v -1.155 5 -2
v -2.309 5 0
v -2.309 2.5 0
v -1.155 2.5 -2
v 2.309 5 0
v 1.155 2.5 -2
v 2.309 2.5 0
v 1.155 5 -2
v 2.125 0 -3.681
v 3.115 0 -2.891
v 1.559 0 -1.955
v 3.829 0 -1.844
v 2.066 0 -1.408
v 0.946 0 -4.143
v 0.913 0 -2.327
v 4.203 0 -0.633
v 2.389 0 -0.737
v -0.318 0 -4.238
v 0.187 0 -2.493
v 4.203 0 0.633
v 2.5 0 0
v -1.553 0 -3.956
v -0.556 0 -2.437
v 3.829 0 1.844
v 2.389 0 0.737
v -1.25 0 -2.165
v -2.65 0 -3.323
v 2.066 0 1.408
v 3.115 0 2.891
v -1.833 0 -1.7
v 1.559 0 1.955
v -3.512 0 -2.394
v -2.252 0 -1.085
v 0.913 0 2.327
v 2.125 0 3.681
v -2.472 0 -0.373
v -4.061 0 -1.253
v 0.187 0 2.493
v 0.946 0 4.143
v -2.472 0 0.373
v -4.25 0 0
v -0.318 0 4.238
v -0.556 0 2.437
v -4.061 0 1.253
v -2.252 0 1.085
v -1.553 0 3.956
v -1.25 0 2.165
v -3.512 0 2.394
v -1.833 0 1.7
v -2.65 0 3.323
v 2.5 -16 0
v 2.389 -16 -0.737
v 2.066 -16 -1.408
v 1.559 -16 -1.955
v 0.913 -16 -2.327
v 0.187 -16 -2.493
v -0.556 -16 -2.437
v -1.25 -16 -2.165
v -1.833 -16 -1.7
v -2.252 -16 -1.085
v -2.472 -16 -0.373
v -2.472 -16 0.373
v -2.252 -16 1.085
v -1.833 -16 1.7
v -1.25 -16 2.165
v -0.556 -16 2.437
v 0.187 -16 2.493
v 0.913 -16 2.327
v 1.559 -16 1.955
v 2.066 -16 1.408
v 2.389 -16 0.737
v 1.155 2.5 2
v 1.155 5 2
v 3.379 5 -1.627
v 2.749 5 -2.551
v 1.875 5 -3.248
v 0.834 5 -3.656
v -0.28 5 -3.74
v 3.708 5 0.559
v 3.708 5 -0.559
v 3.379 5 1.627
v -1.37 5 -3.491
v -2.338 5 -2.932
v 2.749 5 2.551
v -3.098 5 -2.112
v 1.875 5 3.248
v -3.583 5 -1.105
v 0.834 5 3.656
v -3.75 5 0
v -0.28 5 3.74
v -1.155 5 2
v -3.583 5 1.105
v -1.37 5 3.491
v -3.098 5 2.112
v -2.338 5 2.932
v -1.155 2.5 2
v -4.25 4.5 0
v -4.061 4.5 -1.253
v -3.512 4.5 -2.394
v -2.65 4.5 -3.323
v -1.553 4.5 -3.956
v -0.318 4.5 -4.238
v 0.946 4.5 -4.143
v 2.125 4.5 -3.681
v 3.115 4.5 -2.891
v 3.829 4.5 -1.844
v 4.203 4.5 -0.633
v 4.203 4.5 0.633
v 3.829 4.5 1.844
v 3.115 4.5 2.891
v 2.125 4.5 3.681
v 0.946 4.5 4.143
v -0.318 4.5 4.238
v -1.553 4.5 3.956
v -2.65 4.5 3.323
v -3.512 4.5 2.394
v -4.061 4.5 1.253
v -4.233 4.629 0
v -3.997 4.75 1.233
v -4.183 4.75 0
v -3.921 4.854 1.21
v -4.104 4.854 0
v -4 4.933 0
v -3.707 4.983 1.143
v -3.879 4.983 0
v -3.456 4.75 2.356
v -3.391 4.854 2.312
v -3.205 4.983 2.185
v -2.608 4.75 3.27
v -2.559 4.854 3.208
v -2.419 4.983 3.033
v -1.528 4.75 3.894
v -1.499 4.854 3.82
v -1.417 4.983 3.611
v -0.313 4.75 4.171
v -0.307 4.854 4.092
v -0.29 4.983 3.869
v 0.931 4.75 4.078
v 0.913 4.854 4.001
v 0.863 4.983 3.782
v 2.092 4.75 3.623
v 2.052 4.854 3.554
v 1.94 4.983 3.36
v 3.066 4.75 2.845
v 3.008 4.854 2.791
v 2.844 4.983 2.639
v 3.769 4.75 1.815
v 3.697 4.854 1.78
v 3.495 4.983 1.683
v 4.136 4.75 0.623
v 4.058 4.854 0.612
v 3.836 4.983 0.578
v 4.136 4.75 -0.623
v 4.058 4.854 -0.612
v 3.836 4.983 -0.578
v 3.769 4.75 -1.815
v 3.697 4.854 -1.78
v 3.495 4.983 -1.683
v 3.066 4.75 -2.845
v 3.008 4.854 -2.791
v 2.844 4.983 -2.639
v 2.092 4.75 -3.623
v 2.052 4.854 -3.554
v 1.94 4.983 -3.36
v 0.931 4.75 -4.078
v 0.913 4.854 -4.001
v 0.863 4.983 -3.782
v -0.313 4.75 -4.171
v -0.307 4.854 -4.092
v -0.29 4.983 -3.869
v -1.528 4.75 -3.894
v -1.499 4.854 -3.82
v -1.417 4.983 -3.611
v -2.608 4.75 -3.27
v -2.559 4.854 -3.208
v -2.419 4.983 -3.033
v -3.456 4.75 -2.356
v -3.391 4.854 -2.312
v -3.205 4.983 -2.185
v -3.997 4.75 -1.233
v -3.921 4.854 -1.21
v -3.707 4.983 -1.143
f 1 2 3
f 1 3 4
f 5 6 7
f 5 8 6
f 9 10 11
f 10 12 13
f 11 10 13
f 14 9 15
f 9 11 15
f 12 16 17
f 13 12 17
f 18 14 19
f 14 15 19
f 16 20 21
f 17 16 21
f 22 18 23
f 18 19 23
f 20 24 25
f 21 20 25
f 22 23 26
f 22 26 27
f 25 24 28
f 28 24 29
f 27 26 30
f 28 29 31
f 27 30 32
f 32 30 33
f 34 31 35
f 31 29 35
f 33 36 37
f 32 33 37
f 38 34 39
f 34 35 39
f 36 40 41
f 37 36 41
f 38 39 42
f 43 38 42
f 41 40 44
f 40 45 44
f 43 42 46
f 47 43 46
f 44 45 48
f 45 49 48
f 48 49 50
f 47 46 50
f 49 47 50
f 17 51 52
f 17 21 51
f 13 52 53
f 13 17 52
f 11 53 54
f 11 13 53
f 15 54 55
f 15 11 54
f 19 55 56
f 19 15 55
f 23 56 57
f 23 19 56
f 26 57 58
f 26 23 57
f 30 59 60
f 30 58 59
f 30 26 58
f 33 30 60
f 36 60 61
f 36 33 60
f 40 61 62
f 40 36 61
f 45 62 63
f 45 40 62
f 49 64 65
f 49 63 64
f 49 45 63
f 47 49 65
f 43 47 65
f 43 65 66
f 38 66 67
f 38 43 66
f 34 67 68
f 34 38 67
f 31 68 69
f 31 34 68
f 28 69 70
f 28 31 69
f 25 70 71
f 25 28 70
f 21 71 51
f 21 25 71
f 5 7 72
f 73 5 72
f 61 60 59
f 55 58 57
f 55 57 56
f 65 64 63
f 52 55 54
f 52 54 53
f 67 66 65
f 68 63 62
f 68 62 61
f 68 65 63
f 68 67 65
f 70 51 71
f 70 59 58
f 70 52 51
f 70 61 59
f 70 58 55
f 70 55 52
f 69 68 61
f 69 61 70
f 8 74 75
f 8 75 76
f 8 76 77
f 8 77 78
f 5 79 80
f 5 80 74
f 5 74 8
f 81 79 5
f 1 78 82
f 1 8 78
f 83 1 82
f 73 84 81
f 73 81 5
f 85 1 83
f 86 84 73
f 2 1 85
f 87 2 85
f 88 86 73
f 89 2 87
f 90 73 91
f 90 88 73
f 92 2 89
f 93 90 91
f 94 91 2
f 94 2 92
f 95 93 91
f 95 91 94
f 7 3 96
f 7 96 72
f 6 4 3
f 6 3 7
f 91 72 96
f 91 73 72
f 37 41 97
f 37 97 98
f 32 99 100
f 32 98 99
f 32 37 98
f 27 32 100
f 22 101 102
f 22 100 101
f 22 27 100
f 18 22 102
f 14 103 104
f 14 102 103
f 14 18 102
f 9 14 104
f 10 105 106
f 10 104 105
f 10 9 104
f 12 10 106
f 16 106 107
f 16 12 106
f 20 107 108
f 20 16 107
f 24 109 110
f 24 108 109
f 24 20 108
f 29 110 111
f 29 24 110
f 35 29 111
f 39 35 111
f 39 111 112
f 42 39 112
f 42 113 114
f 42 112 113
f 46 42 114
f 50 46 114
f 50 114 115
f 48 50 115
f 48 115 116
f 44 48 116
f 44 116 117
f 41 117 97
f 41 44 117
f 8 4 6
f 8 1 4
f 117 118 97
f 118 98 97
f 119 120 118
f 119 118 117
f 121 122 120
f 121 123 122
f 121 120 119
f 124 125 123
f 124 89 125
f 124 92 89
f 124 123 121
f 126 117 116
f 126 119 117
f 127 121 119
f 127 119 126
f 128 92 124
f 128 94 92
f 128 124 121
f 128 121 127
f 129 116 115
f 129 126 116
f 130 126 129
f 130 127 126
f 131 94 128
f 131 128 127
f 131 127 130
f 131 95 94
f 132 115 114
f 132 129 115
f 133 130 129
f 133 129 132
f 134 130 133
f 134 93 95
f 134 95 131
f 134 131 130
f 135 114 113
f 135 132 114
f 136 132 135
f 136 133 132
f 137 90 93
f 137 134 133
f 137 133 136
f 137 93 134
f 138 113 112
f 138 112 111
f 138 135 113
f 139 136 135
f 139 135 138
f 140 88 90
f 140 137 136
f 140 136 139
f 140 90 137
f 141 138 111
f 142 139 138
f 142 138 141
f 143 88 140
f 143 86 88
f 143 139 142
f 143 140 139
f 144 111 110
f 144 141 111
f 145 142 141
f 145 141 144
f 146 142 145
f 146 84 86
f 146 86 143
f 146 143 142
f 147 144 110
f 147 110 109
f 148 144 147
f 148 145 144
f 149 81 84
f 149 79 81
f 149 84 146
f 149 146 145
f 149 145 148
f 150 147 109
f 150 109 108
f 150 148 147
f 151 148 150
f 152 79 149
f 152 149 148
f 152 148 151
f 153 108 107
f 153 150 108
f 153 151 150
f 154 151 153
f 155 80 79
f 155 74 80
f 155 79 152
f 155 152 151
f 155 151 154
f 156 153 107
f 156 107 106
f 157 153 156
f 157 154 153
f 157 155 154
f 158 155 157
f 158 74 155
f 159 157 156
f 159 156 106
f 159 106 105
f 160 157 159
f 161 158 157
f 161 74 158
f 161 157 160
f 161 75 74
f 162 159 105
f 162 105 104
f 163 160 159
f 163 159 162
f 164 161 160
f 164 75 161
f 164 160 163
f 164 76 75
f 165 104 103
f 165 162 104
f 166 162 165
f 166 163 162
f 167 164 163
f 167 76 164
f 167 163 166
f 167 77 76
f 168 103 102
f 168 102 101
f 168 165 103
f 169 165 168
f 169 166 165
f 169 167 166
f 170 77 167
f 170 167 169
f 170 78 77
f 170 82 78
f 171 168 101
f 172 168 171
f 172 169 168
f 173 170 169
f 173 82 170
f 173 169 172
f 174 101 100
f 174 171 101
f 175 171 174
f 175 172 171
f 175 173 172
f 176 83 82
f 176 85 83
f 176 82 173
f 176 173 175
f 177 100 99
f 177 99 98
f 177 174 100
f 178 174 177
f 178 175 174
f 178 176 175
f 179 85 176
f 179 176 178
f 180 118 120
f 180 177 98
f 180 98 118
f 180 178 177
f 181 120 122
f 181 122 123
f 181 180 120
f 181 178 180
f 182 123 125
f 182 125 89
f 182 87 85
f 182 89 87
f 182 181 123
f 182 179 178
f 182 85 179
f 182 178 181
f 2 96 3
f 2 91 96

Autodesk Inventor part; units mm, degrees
ref_plane "YZ Plane" through (0, 0, 0) normal (1, 0, 0) x (0, 1, 0)
ref_plane "XZ Plane" through (0, 0, 0) normal (0, 1, 0) x (-1, 0, 0)
ref_plane "XY Plane" through (0, 0, 0) normal (0, 0, 1) x (1, 0, 0)
sketch "Cap Cross Section" plane through (0, 0, 0) normal (0, 1, 0) x (-1, 0, 0)
  circle A0 centre (0, 0) radius 4.25
  dimension "d0" = 8.5
extrude "Cap" add sketch "Cap Cross Section" along normal blind 5
sketch "Key Socket Cutout Outline" plane through (0, 5, 0) normal (0, 1, 0) x (1, 0, 0)
  line L0 (1.1547, 2) -> (2.3094, 0)
  line L1 (2.3094, 0) -> (1.1547, -2)
  line L2 (1.1547, -2) -> (-1.1547, -2)
  line L3 (-1.1547, -2) -> (-2.3094, 0)
  line L4 (-2.3094, 0) -> (-1.1547, 2)
  line L5 (-1.1547, 2) -> (1.1547, 2)
  point P0 (0, 0)
  point P1 (0, 0)
  dimension "d3" = 4
extrude "Key Socket Cutout" cut sketch "Key Socket Cutout Outline" against normal blind 2.5
sketch "Body Cross Section" plane through (0, 0, 0) normal (0, -1, 0) x (1, 0, 0)
  circle A0 centre (0, 0) radius 2.5
  dimension "d6" = 5
extrude "Body" add sketch "Body Cross Section" along normal blind 16
thread "Thread" size "M5x0.8" class "6g" standard "ANSI Metric M Profile" full length
fillet "Cap Fillet" radius 0.5 1 edges at (4.25, 5, 0)
properties part number "SSCF-M5-16-A4" material "Stainless Steel AISI 317"
